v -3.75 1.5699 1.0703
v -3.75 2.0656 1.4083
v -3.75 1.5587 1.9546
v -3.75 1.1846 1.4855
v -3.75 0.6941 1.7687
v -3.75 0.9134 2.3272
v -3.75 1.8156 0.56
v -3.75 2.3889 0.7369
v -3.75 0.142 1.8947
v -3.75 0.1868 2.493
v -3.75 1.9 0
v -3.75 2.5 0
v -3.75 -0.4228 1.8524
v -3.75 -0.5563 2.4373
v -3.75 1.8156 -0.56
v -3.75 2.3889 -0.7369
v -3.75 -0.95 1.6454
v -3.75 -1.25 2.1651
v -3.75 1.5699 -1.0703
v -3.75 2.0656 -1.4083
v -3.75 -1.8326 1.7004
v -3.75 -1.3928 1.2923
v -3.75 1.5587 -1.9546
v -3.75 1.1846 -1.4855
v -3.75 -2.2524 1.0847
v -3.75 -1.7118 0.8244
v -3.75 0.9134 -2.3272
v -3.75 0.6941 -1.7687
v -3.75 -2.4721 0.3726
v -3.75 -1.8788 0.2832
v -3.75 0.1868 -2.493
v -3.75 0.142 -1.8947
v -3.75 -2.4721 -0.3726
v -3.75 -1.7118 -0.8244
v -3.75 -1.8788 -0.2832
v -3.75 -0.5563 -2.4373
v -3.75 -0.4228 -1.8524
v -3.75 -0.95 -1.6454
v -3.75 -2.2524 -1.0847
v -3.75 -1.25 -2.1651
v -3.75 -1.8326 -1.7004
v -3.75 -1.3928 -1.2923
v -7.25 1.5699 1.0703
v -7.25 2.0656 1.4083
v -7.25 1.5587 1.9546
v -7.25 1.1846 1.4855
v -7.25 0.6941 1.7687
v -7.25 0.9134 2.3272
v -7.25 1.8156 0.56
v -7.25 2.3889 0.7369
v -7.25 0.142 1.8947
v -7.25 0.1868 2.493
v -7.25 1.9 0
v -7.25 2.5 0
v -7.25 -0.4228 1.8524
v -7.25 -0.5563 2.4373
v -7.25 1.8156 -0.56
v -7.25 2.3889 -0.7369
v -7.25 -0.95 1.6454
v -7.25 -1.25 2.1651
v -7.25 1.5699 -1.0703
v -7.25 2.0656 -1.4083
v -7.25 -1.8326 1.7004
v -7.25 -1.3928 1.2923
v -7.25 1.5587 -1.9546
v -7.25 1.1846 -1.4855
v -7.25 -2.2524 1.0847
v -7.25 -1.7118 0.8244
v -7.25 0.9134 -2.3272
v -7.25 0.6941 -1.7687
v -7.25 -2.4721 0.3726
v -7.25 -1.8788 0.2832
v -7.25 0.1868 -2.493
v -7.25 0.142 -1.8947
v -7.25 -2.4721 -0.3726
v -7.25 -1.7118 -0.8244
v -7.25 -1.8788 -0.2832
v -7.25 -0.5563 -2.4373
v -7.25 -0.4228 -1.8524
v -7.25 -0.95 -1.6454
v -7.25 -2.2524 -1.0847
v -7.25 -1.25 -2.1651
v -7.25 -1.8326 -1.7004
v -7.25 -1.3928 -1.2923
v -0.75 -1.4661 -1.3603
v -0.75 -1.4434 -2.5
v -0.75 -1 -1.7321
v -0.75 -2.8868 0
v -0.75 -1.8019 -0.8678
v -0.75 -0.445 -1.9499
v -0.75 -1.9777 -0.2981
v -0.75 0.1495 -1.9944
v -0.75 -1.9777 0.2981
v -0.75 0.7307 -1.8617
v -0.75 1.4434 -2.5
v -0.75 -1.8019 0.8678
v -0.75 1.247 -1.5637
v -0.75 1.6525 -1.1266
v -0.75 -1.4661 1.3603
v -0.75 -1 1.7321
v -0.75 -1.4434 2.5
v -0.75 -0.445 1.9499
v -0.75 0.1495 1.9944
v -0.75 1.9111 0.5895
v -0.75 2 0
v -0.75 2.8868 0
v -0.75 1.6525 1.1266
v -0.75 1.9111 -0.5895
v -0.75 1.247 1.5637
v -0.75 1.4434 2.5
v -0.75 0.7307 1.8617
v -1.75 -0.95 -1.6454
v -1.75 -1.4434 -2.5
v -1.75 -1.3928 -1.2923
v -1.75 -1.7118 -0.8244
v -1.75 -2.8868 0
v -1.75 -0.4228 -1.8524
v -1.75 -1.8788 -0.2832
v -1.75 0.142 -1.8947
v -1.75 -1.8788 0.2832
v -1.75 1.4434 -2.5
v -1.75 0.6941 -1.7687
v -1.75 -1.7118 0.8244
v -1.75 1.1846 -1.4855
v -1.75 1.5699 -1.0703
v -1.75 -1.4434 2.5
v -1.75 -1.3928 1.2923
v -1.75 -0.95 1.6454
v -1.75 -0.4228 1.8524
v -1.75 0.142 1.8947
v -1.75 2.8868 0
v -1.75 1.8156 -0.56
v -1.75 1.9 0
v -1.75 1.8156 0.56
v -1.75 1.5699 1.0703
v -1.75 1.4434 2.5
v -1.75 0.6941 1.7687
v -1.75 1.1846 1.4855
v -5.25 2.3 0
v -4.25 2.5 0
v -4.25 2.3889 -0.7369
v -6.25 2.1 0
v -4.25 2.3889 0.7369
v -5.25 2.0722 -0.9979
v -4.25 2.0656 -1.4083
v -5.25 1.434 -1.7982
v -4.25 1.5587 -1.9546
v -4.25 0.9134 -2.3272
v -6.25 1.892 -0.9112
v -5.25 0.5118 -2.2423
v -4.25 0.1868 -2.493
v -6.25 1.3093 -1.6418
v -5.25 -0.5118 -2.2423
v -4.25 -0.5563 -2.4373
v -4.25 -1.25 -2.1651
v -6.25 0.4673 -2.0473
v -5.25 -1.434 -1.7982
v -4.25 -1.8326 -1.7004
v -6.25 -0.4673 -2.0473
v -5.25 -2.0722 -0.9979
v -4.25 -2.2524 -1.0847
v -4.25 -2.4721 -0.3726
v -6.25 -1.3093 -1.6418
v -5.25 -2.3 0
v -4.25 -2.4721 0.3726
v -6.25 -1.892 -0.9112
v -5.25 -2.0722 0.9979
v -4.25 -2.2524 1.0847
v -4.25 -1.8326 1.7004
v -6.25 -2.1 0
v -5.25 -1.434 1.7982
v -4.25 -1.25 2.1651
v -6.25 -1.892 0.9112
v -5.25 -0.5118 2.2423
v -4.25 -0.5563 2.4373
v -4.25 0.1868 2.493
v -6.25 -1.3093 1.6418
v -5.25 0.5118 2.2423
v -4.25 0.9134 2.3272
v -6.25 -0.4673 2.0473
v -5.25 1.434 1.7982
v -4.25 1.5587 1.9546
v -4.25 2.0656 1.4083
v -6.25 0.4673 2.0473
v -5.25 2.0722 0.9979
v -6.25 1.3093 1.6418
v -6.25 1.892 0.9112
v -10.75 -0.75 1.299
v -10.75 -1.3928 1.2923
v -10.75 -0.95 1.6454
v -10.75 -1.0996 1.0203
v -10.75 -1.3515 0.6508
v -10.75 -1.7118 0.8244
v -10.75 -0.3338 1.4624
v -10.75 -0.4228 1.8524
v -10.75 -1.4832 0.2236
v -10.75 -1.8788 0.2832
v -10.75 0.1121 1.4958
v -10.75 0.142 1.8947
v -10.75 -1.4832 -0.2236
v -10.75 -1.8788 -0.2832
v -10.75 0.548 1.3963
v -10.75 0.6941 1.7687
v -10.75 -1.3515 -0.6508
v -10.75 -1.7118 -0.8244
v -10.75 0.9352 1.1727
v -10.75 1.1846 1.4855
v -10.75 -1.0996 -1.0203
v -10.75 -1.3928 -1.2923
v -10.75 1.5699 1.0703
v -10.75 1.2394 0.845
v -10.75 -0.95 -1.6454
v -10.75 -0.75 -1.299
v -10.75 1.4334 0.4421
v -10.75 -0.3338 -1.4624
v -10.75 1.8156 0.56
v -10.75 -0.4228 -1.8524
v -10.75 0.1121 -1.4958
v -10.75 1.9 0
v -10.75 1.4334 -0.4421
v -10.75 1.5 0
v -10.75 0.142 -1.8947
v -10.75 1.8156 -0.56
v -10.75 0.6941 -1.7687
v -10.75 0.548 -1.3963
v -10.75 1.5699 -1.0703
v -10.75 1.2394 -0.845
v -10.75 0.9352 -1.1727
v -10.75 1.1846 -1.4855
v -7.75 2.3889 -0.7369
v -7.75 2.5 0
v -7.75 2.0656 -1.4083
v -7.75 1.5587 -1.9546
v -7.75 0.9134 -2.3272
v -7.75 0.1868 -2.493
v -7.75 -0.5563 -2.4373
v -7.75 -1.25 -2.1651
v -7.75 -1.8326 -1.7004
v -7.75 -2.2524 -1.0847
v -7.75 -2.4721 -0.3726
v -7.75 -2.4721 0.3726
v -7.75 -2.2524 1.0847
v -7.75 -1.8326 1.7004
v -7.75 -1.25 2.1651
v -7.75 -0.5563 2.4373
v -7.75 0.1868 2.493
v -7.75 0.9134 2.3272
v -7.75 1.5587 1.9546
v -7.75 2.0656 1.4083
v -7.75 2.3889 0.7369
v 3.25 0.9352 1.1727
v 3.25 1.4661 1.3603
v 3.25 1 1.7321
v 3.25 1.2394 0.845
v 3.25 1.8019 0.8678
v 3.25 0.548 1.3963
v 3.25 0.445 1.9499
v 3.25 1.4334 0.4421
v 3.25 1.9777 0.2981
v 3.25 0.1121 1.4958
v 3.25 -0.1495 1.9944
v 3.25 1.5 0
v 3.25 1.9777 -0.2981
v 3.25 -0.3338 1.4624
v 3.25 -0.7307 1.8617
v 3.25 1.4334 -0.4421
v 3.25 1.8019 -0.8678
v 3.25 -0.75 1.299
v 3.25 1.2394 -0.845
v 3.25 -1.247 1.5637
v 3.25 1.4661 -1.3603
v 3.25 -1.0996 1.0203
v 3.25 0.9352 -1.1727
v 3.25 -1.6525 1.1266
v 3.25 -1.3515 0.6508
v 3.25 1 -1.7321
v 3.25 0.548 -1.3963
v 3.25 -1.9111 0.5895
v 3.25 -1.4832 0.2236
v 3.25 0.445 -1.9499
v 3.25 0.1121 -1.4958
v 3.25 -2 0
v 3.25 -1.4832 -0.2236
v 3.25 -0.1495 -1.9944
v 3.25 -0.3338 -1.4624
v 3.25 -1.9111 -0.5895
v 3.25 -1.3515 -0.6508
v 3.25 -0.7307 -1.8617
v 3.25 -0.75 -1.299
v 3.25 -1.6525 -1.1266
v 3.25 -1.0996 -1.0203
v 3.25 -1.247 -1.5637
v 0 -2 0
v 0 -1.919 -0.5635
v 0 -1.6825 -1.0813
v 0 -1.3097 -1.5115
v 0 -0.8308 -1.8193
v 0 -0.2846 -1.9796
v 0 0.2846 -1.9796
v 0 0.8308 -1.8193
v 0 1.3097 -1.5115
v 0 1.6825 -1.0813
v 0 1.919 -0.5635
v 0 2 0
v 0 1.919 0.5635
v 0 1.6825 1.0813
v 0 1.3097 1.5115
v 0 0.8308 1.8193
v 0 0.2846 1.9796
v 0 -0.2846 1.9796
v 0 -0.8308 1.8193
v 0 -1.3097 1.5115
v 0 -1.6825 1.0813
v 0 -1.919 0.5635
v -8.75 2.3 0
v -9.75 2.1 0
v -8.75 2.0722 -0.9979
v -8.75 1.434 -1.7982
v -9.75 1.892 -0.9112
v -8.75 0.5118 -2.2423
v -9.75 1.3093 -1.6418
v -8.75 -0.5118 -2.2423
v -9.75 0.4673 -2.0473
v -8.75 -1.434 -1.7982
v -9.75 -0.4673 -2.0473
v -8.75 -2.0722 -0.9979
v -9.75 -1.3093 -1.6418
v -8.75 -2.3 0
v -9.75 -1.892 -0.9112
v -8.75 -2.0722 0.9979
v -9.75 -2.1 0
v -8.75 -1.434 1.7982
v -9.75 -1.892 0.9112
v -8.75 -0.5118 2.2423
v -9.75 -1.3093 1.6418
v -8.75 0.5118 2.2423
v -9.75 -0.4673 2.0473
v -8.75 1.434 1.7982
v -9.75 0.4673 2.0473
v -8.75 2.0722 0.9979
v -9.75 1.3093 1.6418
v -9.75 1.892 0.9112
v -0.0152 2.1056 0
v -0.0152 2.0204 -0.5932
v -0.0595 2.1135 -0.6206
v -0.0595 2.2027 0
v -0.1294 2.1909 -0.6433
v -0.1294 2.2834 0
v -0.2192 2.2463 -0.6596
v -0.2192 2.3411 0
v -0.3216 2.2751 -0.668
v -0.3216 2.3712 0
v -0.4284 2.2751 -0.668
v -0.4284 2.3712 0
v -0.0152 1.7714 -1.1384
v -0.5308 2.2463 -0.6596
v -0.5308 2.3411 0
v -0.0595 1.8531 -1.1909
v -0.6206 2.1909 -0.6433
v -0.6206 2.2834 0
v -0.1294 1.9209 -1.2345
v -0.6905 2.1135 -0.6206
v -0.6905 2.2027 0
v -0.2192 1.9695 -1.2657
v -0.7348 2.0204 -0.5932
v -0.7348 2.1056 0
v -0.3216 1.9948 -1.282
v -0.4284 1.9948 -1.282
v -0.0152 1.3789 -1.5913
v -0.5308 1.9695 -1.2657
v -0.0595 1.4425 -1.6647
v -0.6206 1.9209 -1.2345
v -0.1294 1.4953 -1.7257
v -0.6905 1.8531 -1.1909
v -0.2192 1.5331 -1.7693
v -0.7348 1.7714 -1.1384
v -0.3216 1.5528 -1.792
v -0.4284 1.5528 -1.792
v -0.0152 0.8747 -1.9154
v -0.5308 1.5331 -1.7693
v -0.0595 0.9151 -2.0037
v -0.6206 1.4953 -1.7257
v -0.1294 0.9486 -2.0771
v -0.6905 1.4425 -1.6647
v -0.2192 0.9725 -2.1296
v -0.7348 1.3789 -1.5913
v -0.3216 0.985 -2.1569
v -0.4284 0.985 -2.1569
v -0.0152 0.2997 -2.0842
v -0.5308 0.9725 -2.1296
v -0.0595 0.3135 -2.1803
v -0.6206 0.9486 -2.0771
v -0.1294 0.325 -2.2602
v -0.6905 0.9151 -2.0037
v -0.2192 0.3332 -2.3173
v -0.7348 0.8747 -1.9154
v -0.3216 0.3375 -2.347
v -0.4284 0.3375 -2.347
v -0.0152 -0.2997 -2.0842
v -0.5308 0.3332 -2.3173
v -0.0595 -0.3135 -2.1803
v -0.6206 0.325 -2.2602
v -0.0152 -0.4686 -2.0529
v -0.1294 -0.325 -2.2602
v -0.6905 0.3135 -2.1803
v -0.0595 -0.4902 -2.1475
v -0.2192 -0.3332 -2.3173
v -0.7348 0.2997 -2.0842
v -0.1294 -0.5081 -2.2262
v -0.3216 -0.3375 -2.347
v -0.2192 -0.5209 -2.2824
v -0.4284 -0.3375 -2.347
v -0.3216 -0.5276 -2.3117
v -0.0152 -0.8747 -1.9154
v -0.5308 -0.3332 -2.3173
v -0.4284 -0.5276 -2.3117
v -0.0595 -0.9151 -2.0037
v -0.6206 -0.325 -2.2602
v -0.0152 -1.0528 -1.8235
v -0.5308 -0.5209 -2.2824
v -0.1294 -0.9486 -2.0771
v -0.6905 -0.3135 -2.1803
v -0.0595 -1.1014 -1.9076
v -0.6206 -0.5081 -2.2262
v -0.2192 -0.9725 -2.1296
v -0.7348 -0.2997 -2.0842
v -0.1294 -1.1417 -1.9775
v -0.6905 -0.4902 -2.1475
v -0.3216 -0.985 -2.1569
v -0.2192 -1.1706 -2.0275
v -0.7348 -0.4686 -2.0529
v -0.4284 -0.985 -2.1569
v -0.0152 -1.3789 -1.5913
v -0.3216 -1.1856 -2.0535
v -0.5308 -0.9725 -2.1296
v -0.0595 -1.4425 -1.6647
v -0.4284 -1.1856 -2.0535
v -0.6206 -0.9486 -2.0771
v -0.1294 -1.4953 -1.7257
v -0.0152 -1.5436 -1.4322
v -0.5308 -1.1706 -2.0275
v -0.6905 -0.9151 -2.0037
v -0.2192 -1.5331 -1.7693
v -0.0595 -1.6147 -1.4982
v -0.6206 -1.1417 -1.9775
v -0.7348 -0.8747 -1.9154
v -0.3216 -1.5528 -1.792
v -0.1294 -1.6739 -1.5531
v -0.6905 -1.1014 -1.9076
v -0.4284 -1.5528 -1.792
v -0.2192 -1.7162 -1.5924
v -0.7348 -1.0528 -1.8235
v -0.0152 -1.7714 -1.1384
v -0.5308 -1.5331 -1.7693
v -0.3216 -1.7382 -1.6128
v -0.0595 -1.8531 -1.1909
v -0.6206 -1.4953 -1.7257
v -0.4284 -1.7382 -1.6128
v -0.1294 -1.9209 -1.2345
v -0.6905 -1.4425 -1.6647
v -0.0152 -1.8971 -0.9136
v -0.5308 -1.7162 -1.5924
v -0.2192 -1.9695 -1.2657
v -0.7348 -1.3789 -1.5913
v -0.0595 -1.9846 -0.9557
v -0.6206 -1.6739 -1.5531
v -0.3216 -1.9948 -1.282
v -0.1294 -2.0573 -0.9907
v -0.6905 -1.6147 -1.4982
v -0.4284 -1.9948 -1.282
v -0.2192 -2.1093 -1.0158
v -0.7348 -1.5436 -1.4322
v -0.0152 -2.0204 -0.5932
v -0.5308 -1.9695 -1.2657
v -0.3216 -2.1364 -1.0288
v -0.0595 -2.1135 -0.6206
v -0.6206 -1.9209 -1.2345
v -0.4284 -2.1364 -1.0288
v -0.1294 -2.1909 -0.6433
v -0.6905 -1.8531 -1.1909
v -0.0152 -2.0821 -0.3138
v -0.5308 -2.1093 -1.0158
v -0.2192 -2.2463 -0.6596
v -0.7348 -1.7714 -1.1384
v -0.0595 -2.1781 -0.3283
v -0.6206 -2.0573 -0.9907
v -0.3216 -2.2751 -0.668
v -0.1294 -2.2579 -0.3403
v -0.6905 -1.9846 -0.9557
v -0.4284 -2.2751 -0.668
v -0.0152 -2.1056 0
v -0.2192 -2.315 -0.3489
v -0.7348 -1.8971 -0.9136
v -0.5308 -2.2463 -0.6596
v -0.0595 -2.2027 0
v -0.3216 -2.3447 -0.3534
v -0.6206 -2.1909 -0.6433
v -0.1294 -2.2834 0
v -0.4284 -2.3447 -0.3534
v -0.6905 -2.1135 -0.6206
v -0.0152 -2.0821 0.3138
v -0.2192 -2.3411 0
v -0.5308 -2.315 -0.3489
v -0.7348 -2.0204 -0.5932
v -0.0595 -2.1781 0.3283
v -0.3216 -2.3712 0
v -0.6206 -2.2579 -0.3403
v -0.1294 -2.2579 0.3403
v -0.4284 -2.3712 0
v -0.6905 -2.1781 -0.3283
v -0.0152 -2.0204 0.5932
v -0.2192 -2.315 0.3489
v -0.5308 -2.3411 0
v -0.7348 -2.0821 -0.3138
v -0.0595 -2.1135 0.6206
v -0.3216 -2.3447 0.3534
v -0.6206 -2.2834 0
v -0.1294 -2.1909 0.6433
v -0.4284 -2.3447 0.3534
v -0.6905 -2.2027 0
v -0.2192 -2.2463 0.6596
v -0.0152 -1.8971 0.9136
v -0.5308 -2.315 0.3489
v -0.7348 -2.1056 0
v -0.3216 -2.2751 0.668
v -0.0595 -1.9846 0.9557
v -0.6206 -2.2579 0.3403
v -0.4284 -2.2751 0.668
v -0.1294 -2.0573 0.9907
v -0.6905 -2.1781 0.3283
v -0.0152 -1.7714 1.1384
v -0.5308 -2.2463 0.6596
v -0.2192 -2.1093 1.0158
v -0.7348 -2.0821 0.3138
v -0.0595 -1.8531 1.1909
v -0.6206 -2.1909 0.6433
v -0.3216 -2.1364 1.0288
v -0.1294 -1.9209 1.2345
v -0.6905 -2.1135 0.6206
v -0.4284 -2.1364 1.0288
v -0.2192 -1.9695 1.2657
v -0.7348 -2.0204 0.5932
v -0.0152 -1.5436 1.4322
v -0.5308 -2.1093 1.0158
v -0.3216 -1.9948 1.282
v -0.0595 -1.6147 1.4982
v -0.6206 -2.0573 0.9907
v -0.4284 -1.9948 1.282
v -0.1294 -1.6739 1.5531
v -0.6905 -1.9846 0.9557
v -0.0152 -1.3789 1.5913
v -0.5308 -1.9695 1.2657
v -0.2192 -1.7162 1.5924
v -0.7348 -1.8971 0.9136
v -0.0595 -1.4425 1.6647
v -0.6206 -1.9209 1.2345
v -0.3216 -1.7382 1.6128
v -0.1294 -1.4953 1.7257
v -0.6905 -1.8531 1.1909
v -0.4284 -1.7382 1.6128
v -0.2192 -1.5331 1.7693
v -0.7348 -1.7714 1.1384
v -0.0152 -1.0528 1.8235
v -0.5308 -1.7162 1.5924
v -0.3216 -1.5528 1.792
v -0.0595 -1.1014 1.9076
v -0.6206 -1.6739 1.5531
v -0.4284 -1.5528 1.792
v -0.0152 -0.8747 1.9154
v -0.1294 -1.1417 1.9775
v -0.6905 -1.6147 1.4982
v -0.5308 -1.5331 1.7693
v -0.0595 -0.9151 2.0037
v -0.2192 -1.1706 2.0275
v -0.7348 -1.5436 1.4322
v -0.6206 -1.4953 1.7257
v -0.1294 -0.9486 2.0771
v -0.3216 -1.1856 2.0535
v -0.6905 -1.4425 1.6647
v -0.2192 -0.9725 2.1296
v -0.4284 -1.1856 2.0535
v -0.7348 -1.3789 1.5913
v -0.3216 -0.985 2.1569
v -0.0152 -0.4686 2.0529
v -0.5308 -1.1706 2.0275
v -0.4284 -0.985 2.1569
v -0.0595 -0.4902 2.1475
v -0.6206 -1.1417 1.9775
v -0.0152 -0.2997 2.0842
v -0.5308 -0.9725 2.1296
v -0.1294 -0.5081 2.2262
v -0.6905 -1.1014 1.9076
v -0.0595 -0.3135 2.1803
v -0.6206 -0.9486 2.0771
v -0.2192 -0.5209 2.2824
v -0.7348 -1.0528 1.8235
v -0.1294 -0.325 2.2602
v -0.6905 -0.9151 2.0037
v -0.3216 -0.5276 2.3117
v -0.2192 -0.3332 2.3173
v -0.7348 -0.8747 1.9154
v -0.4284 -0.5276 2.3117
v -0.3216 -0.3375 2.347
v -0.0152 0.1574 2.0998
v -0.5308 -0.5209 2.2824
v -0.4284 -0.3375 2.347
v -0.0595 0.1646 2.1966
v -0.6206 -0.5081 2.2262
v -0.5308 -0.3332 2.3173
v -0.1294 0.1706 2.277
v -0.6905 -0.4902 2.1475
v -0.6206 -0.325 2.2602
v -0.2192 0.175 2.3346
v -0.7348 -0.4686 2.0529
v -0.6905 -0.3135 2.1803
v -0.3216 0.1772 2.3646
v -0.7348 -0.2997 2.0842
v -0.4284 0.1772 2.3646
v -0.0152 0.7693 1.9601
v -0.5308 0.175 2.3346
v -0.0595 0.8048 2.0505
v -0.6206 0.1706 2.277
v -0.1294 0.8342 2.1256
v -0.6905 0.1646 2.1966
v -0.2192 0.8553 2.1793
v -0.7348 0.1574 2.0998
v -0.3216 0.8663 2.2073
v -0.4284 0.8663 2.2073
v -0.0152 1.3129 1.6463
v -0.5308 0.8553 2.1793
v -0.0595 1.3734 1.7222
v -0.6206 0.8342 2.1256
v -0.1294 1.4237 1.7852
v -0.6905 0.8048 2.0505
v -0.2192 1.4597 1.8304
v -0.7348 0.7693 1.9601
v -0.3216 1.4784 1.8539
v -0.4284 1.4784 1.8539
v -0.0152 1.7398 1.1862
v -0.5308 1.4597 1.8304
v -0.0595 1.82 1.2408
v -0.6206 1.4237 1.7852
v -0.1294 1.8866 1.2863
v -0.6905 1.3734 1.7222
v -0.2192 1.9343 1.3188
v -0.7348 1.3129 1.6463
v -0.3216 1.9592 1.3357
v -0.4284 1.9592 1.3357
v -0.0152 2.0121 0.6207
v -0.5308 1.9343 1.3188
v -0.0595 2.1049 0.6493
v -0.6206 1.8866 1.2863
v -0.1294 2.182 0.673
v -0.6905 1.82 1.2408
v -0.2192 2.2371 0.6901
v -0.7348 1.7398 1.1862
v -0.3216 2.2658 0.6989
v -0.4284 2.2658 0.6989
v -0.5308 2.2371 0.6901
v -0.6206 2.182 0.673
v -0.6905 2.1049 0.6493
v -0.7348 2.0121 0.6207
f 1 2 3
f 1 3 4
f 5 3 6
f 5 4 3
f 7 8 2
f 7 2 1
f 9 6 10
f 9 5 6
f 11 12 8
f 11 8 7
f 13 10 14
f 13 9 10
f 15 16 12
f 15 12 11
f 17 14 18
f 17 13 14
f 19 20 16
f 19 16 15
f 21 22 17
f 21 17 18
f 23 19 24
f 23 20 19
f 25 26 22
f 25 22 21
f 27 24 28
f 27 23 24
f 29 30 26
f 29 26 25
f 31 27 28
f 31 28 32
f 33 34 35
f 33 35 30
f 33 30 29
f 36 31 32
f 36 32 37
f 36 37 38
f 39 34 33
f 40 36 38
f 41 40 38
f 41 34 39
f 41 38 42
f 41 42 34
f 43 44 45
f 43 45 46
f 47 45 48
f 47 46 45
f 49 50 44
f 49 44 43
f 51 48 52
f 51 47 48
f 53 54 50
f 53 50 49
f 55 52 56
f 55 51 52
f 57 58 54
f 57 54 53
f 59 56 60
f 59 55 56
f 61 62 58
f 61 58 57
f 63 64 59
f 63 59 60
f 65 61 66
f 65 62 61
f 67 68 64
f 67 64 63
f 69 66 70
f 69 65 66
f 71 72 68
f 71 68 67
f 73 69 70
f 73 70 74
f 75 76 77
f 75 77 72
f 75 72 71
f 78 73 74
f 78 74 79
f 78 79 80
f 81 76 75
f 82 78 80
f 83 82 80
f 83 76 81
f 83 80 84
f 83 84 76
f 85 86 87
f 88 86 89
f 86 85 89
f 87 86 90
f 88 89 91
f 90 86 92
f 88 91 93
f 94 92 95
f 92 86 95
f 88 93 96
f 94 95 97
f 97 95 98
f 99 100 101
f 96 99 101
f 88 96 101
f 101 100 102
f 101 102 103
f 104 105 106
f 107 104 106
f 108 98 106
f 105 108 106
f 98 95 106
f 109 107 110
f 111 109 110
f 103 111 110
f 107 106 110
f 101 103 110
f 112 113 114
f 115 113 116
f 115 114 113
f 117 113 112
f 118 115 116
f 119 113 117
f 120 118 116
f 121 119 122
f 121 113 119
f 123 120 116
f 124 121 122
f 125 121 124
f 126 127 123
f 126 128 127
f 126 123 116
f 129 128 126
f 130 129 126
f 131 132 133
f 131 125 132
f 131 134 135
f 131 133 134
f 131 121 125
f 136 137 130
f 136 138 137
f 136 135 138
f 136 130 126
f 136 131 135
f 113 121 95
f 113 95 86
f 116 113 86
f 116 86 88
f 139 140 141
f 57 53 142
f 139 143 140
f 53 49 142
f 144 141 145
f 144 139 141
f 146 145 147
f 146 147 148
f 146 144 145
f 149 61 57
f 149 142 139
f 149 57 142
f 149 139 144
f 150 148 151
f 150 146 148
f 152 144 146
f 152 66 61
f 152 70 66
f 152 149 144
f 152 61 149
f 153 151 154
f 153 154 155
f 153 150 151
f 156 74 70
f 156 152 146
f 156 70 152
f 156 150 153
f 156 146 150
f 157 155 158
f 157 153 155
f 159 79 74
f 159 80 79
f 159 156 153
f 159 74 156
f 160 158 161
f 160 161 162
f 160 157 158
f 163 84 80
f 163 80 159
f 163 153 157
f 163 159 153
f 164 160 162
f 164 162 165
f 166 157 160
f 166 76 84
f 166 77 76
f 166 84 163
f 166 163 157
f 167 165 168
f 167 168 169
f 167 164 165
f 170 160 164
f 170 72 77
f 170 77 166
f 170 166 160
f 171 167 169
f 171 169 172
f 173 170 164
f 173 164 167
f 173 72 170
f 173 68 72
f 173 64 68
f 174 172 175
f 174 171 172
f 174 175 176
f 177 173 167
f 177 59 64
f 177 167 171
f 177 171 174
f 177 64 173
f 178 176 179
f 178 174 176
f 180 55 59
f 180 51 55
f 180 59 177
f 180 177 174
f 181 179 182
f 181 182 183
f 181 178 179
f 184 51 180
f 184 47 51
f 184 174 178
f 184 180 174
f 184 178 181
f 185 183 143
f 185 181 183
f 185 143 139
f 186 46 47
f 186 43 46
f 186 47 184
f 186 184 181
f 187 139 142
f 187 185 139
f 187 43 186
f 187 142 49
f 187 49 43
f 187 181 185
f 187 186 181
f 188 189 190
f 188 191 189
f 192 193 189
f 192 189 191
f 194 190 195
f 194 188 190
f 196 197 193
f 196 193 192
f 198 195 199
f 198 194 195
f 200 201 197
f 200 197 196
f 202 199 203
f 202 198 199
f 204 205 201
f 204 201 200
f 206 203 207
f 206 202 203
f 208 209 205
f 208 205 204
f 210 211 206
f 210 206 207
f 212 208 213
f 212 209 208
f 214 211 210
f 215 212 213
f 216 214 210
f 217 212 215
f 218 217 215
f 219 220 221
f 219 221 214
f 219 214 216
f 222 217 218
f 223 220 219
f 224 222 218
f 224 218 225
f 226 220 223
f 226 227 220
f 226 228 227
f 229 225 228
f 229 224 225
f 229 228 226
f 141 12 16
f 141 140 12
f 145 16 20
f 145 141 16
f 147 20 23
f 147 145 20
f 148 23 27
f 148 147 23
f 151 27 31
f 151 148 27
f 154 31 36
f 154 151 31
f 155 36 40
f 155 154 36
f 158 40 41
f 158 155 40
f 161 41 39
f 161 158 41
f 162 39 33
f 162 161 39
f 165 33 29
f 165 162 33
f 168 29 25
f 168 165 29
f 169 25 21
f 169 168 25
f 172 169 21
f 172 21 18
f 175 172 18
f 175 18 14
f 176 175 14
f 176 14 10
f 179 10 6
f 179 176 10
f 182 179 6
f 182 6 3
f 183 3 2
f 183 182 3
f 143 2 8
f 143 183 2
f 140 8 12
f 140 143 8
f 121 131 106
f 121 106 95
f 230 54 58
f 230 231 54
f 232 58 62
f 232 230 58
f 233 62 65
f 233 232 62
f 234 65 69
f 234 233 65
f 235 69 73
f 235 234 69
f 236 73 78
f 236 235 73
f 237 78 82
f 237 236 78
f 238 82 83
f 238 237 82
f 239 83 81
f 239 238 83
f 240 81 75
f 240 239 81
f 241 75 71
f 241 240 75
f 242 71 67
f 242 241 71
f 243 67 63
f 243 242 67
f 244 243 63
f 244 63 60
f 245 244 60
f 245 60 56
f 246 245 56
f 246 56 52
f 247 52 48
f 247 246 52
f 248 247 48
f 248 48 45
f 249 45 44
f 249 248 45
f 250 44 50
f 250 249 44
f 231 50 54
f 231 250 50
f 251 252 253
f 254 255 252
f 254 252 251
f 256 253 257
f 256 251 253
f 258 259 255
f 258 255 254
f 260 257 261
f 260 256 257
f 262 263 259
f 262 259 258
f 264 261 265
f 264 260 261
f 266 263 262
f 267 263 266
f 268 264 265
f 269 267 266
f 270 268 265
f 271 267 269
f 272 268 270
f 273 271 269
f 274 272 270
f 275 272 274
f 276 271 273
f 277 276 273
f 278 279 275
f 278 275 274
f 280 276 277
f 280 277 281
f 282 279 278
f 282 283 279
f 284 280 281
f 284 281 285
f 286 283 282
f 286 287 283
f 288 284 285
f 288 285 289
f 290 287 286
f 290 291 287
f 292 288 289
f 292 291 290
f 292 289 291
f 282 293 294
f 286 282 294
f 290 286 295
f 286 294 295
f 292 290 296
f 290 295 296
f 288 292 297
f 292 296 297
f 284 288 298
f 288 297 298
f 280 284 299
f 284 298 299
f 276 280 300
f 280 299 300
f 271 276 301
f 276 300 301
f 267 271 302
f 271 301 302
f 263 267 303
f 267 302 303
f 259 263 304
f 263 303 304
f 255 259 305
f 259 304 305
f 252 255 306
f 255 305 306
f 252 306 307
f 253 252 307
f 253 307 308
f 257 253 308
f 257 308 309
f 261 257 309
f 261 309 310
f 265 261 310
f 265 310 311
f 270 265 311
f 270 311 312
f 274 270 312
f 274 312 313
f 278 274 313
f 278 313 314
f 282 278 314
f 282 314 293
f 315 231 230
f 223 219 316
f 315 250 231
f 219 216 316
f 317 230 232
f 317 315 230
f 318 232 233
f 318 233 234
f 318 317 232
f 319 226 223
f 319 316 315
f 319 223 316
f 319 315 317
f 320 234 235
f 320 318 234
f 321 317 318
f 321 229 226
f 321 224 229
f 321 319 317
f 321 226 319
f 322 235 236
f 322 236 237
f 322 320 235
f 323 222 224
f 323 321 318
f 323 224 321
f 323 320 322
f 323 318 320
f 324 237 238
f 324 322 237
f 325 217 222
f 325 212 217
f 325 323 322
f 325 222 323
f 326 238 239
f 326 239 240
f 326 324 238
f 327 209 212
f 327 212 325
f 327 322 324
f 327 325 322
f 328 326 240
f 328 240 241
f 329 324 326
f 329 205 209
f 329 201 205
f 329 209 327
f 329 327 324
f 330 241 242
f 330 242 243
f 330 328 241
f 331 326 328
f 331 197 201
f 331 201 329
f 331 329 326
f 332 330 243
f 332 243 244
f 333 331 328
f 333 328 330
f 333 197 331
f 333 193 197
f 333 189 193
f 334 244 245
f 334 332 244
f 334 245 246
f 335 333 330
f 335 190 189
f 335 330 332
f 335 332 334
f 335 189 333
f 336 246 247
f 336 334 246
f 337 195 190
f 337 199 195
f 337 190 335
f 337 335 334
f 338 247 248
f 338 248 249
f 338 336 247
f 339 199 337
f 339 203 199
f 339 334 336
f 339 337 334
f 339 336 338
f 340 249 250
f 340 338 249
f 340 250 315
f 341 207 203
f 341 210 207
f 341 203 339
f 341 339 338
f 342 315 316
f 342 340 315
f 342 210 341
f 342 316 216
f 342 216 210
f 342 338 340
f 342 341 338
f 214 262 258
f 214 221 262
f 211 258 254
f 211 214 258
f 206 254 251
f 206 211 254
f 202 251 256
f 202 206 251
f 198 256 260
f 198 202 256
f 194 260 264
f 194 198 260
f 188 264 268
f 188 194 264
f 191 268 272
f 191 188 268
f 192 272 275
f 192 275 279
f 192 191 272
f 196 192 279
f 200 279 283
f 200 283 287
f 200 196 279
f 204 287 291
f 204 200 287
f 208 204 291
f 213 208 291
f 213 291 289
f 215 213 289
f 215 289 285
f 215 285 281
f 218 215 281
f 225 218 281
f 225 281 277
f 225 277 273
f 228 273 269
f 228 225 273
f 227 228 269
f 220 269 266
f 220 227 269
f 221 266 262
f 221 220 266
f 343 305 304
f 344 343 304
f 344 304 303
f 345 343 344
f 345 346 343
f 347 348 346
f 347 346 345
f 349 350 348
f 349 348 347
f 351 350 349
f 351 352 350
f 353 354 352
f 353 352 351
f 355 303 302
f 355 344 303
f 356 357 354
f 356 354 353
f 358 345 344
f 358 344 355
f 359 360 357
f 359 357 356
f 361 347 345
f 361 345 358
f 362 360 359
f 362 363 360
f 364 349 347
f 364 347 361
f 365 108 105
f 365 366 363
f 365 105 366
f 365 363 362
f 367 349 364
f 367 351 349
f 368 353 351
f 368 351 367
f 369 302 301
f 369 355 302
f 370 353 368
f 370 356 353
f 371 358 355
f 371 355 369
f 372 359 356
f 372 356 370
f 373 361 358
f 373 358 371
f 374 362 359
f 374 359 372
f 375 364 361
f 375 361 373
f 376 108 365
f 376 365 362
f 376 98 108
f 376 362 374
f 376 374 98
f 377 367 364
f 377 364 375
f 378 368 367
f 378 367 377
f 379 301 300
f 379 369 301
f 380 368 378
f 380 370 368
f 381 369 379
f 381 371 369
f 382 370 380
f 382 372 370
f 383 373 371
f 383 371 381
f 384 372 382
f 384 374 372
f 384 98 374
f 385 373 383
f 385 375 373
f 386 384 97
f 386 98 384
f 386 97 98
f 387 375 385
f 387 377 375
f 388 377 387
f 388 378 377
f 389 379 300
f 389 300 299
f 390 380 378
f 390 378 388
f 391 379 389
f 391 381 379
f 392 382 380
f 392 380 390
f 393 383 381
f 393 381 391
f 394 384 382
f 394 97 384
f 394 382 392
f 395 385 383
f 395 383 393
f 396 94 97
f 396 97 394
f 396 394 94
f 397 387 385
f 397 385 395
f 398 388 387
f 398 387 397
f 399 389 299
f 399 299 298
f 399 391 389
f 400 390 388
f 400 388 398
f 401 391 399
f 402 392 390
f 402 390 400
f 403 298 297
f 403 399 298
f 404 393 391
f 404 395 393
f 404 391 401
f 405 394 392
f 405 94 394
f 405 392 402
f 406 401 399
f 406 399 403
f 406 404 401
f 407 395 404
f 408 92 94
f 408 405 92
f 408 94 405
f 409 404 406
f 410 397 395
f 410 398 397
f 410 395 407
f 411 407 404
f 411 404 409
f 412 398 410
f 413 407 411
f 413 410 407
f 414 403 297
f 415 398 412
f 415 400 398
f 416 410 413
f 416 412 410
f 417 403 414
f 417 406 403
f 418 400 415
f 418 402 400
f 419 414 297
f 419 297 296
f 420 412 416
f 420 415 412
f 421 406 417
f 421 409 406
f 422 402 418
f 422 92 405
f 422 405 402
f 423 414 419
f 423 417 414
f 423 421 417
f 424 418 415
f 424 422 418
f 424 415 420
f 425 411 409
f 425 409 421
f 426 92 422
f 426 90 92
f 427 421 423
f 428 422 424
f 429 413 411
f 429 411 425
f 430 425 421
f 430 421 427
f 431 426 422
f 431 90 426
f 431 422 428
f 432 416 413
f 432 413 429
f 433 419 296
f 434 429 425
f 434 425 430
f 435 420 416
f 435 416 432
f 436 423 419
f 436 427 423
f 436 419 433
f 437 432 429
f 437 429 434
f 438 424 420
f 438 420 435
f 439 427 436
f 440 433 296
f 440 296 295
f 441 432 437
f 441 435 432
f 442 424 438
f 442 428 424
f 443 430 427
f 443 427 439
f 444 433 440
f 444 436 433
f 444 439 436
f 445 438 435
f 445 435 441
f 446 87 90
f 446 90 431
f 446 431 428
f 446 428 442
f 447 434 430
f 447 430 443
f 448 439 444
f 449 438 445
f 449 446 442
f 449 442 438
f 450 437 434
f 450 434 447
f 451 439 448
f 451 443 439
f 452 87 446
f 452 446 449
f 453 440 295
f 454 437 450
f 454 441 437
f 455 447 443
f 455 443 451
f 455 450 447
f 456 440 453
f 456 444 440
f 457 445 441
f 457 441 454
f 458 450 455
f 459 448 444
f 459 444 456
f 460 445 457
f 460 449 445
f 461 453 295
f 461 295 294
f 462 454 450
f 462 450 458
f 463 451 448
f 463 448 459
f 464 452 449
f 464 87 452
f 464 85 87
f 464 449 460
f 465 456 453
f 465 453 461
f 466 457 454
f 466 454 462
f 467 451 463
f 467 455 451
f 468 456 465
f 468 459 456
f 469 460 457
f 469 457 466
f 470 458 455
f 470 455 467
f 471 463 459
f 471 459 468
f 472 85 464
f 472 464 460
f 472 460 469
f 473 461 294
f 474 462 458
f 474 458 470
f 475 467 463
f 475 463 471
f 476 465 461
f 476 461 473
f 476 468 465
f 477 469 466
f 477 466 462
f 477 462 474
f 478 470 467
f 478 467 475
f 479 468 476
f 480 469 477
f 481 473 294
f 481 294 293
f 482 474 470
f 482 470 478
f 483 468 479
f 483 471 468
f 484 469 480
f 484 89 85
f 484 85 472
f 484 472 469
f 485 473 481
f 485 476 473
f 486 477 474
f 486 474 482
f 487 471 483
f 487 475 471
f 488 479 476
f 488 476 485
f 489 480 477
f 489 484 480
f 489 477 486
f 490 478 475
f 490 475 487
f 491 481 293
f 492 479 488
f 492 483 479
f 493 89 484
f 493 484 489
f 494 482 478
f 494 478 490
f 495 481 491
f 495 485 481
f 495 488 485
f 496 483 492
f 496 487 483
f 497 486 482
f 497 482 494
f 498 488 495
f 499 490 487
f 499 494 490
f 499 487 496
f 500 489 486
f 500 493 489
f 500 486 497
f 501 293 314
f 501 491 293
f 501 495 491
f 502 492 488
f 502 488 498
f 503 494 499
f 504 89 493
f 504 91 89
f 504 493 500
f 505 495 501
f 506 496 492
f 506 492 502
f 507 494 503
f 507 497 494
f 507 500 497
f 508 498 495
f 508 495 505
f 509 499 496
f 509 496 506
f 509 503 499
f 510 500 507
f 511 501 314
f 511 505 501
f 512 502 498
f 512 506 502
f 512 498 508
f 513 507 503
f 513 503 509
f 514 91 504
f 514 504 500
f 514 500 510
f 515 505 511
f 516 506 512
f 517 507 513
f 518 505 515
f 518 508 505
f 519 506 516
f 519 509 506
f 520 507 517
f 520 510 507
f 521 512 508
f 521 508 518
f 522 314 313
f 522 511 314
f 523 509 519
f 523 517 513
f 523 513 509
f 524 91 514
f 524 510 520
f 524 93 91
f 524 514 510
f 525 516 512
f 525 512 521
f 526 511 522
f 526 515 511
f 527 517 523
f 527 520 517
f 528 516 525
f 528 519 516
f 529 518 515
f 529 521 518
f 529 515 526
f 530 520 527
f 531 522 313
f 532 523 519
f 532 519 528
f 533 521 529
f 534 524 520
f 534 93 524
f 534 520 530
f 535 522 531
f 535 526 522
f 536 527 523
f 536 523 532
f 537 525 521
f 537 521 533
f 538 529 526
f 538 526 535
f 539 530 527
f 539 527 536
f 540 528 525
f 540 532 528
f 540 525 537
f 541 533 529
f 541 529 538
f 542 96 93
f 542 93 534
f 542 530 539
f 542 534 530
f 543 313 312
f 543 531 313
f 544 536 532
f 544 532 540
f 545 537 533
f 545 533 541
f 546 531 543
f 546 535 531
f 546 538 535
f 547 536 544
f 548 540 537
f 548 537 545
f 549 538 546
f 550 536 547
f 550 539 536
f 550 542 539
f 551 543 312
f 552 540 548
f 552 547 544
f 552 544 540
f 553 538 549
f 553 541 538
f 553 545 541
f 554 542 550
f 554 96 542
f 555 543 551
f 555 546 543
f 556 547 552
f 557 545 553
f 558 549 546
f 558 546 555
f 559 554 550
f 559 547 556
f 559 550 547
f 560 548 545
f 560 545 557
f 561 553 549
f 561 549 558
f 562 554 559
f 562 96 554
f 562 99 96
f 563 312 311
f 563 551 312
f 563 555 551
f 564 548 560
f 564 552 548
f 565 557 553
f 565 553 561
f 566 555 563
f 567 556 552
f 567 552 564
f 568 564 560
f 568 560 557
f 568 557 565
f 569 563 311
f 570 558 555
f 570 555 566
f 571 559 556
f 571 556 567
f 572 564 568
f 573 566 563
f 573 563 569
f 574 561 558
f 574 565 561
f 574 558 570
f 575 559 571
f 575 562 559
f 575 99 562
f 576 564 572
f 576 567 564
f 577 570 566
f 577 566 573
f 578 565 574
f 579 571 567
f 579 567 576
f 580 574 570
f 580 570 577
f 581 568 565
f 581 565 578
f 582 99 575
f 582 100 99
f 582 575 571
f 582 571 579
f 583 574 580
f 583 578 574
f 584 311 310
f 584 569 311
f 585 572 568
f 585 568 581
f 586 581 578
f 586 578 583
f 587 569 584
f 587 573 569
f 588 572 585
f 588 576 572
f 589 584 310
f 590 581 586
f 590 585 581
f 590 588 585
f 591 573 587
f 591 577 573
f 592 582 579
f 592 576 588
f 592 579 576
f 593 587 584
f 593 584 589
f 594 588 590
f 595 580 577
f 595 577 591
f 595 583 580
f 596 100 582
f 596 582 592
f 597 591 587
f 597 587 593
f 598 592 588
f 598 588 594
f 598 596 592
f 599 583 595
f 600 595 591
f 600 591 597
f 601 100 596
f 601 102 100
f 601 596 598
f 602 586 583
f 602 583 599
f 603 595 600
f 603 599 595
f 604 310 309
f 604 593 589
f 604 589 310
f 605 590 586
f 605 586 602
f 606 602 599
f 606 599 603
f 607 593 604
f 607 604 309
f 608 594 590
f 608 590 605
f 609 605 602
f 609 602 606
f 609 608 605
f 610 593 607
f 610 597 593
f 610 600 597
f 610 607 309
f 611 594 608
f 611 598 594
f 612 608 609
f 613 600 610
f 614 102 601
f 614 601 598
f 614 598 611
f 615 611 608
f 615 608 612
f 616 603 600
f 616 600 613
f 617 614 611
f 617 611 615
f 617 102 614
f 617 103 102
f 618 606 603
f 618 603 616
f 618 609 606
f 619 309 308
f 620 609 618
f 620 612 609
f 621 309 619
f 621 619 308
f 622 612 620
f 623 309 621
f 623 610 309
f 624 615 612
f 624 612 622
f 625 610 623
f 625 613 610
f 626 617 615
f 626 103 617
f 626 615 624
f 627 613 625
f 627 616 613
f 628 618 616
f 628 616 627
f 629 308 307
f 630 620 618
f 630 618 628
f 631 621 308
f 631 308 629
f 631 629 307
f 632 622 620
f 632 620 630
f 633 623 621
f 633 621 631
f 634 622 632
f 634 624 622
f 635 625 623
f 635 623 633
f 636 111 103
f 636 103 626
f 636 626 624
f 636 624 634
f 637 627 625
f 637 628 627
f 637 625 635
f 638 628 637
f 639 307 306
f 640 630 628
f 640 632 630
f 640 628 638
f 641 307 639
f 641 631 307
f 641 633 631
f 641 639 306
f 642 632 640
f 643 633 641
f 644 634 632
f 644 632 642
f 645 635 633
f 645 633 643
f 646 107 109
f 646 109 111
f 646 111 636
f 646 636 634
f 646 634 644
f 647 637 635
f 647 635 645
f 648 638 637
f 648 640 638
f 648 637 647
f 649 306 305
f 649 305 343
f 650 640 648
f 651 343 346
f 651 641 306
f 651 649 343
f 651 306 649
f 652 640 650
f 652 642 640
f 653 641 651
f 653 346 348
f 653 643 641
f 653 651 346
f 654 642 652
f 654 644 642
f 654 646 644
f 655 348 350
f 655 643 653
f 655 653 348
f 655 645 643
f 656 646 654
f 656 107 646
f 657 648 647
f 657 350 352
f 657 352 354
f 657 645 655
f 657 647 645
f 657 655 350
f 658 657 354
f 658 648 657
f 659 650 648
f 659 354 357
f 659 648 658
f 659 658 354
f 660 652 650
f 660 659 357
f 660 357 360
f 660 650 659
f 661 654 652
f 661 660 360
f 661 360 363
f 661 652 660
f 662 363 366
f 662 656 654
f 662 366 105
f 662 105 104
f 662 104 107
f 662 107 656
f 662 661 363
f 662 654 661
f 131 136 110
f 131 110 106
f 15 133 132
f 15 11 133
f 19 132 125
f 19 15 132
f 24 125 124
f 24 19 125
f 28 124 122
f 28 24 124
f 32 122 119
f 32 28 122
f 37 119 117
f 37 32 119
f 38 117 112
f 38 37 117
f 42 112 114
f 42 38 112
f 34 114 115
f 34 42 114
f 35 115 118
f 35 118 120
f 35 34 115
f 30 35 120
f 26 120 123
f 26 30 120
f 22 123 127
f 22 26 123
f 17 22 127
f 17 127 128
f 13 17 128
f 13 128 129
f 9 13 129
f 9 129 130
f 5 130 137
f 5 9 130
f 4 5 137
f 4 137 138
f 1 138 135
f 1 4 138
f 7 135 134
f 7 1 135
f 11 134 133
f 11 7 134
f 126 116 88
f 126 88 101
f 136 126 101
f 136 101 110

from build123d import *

# Parameters (mm, degrees)
ESQUISSE1_R        = 0.375
ESQUISSE2_R        = 1.5
BOSS_EXTRU_1_DEPTH = 1
ESQUISSE3_R        = 2
ESQUISSE3_R_2      = 1.5
BOSS_EXTRU_2_DEPTH = 4


with BuildPart() as part:
    # Esquisse1 → Révolution1 (revolve)
    with BuildSketch(Plane.XY):
        with Locations((-0.375, 2)):
            Circle(ESQUISSE1_R)
        Polygon((-10.75, 1.5), (-1.75, 1.5), (-1.75, 1.9), (-3.75, 1.9), (-3.75, 2.5), (-4.25, 2.5), (-7.25, 1.9), (-7.25, 2.5), (-7.75, 2.5), (-10.75, 1.9), align=None)
    revolve(axis=Axis((0, 0, 0), (-1, 0, 0)))

    # Esquisse2 → Boss.-Extru.1 (add)
    with BuildSketch(Plane(origin=(-1.75, 0, 0), x_dir=(0, 0, -1), z_dir=(1, 0, 0))):
        Polygon((-2.5, -1.443375673), (-2.5, 1.443375673), (0, 2.886751346), (2.5, 1.443375673), (2.5, -1.443375673), (0, -2.886751346), align=None)
        with Locations(Location((0, 0, 0), (0, 0, 90))):
            Circle(ESQUISSE2_R, mode=Mode.SUBTRACT)
    extrude(amount=BOSS_EXTRU_1_DEPTH)

    # Esquisse3 → Boss.-Extru.2 (add)
    with BuildSketch(Plane(origin=(-0.75, 0, 0), x_dir=(0, 0, -1), z_dir=(1, 0, 0))):
        with Locations(Location((0, 0, 0), (0, 0, 270))):
            Circle(ESQUISSE3_R)
        with Locations(Location((0, 0, 0), (0, 0, 90))):
            Circle(ESQUISSE3_R_2, mode=Mode.SUBTRACT)
    extrude(amount=BOSS_EXTRU_2_DEPTH)


solid = part.part
